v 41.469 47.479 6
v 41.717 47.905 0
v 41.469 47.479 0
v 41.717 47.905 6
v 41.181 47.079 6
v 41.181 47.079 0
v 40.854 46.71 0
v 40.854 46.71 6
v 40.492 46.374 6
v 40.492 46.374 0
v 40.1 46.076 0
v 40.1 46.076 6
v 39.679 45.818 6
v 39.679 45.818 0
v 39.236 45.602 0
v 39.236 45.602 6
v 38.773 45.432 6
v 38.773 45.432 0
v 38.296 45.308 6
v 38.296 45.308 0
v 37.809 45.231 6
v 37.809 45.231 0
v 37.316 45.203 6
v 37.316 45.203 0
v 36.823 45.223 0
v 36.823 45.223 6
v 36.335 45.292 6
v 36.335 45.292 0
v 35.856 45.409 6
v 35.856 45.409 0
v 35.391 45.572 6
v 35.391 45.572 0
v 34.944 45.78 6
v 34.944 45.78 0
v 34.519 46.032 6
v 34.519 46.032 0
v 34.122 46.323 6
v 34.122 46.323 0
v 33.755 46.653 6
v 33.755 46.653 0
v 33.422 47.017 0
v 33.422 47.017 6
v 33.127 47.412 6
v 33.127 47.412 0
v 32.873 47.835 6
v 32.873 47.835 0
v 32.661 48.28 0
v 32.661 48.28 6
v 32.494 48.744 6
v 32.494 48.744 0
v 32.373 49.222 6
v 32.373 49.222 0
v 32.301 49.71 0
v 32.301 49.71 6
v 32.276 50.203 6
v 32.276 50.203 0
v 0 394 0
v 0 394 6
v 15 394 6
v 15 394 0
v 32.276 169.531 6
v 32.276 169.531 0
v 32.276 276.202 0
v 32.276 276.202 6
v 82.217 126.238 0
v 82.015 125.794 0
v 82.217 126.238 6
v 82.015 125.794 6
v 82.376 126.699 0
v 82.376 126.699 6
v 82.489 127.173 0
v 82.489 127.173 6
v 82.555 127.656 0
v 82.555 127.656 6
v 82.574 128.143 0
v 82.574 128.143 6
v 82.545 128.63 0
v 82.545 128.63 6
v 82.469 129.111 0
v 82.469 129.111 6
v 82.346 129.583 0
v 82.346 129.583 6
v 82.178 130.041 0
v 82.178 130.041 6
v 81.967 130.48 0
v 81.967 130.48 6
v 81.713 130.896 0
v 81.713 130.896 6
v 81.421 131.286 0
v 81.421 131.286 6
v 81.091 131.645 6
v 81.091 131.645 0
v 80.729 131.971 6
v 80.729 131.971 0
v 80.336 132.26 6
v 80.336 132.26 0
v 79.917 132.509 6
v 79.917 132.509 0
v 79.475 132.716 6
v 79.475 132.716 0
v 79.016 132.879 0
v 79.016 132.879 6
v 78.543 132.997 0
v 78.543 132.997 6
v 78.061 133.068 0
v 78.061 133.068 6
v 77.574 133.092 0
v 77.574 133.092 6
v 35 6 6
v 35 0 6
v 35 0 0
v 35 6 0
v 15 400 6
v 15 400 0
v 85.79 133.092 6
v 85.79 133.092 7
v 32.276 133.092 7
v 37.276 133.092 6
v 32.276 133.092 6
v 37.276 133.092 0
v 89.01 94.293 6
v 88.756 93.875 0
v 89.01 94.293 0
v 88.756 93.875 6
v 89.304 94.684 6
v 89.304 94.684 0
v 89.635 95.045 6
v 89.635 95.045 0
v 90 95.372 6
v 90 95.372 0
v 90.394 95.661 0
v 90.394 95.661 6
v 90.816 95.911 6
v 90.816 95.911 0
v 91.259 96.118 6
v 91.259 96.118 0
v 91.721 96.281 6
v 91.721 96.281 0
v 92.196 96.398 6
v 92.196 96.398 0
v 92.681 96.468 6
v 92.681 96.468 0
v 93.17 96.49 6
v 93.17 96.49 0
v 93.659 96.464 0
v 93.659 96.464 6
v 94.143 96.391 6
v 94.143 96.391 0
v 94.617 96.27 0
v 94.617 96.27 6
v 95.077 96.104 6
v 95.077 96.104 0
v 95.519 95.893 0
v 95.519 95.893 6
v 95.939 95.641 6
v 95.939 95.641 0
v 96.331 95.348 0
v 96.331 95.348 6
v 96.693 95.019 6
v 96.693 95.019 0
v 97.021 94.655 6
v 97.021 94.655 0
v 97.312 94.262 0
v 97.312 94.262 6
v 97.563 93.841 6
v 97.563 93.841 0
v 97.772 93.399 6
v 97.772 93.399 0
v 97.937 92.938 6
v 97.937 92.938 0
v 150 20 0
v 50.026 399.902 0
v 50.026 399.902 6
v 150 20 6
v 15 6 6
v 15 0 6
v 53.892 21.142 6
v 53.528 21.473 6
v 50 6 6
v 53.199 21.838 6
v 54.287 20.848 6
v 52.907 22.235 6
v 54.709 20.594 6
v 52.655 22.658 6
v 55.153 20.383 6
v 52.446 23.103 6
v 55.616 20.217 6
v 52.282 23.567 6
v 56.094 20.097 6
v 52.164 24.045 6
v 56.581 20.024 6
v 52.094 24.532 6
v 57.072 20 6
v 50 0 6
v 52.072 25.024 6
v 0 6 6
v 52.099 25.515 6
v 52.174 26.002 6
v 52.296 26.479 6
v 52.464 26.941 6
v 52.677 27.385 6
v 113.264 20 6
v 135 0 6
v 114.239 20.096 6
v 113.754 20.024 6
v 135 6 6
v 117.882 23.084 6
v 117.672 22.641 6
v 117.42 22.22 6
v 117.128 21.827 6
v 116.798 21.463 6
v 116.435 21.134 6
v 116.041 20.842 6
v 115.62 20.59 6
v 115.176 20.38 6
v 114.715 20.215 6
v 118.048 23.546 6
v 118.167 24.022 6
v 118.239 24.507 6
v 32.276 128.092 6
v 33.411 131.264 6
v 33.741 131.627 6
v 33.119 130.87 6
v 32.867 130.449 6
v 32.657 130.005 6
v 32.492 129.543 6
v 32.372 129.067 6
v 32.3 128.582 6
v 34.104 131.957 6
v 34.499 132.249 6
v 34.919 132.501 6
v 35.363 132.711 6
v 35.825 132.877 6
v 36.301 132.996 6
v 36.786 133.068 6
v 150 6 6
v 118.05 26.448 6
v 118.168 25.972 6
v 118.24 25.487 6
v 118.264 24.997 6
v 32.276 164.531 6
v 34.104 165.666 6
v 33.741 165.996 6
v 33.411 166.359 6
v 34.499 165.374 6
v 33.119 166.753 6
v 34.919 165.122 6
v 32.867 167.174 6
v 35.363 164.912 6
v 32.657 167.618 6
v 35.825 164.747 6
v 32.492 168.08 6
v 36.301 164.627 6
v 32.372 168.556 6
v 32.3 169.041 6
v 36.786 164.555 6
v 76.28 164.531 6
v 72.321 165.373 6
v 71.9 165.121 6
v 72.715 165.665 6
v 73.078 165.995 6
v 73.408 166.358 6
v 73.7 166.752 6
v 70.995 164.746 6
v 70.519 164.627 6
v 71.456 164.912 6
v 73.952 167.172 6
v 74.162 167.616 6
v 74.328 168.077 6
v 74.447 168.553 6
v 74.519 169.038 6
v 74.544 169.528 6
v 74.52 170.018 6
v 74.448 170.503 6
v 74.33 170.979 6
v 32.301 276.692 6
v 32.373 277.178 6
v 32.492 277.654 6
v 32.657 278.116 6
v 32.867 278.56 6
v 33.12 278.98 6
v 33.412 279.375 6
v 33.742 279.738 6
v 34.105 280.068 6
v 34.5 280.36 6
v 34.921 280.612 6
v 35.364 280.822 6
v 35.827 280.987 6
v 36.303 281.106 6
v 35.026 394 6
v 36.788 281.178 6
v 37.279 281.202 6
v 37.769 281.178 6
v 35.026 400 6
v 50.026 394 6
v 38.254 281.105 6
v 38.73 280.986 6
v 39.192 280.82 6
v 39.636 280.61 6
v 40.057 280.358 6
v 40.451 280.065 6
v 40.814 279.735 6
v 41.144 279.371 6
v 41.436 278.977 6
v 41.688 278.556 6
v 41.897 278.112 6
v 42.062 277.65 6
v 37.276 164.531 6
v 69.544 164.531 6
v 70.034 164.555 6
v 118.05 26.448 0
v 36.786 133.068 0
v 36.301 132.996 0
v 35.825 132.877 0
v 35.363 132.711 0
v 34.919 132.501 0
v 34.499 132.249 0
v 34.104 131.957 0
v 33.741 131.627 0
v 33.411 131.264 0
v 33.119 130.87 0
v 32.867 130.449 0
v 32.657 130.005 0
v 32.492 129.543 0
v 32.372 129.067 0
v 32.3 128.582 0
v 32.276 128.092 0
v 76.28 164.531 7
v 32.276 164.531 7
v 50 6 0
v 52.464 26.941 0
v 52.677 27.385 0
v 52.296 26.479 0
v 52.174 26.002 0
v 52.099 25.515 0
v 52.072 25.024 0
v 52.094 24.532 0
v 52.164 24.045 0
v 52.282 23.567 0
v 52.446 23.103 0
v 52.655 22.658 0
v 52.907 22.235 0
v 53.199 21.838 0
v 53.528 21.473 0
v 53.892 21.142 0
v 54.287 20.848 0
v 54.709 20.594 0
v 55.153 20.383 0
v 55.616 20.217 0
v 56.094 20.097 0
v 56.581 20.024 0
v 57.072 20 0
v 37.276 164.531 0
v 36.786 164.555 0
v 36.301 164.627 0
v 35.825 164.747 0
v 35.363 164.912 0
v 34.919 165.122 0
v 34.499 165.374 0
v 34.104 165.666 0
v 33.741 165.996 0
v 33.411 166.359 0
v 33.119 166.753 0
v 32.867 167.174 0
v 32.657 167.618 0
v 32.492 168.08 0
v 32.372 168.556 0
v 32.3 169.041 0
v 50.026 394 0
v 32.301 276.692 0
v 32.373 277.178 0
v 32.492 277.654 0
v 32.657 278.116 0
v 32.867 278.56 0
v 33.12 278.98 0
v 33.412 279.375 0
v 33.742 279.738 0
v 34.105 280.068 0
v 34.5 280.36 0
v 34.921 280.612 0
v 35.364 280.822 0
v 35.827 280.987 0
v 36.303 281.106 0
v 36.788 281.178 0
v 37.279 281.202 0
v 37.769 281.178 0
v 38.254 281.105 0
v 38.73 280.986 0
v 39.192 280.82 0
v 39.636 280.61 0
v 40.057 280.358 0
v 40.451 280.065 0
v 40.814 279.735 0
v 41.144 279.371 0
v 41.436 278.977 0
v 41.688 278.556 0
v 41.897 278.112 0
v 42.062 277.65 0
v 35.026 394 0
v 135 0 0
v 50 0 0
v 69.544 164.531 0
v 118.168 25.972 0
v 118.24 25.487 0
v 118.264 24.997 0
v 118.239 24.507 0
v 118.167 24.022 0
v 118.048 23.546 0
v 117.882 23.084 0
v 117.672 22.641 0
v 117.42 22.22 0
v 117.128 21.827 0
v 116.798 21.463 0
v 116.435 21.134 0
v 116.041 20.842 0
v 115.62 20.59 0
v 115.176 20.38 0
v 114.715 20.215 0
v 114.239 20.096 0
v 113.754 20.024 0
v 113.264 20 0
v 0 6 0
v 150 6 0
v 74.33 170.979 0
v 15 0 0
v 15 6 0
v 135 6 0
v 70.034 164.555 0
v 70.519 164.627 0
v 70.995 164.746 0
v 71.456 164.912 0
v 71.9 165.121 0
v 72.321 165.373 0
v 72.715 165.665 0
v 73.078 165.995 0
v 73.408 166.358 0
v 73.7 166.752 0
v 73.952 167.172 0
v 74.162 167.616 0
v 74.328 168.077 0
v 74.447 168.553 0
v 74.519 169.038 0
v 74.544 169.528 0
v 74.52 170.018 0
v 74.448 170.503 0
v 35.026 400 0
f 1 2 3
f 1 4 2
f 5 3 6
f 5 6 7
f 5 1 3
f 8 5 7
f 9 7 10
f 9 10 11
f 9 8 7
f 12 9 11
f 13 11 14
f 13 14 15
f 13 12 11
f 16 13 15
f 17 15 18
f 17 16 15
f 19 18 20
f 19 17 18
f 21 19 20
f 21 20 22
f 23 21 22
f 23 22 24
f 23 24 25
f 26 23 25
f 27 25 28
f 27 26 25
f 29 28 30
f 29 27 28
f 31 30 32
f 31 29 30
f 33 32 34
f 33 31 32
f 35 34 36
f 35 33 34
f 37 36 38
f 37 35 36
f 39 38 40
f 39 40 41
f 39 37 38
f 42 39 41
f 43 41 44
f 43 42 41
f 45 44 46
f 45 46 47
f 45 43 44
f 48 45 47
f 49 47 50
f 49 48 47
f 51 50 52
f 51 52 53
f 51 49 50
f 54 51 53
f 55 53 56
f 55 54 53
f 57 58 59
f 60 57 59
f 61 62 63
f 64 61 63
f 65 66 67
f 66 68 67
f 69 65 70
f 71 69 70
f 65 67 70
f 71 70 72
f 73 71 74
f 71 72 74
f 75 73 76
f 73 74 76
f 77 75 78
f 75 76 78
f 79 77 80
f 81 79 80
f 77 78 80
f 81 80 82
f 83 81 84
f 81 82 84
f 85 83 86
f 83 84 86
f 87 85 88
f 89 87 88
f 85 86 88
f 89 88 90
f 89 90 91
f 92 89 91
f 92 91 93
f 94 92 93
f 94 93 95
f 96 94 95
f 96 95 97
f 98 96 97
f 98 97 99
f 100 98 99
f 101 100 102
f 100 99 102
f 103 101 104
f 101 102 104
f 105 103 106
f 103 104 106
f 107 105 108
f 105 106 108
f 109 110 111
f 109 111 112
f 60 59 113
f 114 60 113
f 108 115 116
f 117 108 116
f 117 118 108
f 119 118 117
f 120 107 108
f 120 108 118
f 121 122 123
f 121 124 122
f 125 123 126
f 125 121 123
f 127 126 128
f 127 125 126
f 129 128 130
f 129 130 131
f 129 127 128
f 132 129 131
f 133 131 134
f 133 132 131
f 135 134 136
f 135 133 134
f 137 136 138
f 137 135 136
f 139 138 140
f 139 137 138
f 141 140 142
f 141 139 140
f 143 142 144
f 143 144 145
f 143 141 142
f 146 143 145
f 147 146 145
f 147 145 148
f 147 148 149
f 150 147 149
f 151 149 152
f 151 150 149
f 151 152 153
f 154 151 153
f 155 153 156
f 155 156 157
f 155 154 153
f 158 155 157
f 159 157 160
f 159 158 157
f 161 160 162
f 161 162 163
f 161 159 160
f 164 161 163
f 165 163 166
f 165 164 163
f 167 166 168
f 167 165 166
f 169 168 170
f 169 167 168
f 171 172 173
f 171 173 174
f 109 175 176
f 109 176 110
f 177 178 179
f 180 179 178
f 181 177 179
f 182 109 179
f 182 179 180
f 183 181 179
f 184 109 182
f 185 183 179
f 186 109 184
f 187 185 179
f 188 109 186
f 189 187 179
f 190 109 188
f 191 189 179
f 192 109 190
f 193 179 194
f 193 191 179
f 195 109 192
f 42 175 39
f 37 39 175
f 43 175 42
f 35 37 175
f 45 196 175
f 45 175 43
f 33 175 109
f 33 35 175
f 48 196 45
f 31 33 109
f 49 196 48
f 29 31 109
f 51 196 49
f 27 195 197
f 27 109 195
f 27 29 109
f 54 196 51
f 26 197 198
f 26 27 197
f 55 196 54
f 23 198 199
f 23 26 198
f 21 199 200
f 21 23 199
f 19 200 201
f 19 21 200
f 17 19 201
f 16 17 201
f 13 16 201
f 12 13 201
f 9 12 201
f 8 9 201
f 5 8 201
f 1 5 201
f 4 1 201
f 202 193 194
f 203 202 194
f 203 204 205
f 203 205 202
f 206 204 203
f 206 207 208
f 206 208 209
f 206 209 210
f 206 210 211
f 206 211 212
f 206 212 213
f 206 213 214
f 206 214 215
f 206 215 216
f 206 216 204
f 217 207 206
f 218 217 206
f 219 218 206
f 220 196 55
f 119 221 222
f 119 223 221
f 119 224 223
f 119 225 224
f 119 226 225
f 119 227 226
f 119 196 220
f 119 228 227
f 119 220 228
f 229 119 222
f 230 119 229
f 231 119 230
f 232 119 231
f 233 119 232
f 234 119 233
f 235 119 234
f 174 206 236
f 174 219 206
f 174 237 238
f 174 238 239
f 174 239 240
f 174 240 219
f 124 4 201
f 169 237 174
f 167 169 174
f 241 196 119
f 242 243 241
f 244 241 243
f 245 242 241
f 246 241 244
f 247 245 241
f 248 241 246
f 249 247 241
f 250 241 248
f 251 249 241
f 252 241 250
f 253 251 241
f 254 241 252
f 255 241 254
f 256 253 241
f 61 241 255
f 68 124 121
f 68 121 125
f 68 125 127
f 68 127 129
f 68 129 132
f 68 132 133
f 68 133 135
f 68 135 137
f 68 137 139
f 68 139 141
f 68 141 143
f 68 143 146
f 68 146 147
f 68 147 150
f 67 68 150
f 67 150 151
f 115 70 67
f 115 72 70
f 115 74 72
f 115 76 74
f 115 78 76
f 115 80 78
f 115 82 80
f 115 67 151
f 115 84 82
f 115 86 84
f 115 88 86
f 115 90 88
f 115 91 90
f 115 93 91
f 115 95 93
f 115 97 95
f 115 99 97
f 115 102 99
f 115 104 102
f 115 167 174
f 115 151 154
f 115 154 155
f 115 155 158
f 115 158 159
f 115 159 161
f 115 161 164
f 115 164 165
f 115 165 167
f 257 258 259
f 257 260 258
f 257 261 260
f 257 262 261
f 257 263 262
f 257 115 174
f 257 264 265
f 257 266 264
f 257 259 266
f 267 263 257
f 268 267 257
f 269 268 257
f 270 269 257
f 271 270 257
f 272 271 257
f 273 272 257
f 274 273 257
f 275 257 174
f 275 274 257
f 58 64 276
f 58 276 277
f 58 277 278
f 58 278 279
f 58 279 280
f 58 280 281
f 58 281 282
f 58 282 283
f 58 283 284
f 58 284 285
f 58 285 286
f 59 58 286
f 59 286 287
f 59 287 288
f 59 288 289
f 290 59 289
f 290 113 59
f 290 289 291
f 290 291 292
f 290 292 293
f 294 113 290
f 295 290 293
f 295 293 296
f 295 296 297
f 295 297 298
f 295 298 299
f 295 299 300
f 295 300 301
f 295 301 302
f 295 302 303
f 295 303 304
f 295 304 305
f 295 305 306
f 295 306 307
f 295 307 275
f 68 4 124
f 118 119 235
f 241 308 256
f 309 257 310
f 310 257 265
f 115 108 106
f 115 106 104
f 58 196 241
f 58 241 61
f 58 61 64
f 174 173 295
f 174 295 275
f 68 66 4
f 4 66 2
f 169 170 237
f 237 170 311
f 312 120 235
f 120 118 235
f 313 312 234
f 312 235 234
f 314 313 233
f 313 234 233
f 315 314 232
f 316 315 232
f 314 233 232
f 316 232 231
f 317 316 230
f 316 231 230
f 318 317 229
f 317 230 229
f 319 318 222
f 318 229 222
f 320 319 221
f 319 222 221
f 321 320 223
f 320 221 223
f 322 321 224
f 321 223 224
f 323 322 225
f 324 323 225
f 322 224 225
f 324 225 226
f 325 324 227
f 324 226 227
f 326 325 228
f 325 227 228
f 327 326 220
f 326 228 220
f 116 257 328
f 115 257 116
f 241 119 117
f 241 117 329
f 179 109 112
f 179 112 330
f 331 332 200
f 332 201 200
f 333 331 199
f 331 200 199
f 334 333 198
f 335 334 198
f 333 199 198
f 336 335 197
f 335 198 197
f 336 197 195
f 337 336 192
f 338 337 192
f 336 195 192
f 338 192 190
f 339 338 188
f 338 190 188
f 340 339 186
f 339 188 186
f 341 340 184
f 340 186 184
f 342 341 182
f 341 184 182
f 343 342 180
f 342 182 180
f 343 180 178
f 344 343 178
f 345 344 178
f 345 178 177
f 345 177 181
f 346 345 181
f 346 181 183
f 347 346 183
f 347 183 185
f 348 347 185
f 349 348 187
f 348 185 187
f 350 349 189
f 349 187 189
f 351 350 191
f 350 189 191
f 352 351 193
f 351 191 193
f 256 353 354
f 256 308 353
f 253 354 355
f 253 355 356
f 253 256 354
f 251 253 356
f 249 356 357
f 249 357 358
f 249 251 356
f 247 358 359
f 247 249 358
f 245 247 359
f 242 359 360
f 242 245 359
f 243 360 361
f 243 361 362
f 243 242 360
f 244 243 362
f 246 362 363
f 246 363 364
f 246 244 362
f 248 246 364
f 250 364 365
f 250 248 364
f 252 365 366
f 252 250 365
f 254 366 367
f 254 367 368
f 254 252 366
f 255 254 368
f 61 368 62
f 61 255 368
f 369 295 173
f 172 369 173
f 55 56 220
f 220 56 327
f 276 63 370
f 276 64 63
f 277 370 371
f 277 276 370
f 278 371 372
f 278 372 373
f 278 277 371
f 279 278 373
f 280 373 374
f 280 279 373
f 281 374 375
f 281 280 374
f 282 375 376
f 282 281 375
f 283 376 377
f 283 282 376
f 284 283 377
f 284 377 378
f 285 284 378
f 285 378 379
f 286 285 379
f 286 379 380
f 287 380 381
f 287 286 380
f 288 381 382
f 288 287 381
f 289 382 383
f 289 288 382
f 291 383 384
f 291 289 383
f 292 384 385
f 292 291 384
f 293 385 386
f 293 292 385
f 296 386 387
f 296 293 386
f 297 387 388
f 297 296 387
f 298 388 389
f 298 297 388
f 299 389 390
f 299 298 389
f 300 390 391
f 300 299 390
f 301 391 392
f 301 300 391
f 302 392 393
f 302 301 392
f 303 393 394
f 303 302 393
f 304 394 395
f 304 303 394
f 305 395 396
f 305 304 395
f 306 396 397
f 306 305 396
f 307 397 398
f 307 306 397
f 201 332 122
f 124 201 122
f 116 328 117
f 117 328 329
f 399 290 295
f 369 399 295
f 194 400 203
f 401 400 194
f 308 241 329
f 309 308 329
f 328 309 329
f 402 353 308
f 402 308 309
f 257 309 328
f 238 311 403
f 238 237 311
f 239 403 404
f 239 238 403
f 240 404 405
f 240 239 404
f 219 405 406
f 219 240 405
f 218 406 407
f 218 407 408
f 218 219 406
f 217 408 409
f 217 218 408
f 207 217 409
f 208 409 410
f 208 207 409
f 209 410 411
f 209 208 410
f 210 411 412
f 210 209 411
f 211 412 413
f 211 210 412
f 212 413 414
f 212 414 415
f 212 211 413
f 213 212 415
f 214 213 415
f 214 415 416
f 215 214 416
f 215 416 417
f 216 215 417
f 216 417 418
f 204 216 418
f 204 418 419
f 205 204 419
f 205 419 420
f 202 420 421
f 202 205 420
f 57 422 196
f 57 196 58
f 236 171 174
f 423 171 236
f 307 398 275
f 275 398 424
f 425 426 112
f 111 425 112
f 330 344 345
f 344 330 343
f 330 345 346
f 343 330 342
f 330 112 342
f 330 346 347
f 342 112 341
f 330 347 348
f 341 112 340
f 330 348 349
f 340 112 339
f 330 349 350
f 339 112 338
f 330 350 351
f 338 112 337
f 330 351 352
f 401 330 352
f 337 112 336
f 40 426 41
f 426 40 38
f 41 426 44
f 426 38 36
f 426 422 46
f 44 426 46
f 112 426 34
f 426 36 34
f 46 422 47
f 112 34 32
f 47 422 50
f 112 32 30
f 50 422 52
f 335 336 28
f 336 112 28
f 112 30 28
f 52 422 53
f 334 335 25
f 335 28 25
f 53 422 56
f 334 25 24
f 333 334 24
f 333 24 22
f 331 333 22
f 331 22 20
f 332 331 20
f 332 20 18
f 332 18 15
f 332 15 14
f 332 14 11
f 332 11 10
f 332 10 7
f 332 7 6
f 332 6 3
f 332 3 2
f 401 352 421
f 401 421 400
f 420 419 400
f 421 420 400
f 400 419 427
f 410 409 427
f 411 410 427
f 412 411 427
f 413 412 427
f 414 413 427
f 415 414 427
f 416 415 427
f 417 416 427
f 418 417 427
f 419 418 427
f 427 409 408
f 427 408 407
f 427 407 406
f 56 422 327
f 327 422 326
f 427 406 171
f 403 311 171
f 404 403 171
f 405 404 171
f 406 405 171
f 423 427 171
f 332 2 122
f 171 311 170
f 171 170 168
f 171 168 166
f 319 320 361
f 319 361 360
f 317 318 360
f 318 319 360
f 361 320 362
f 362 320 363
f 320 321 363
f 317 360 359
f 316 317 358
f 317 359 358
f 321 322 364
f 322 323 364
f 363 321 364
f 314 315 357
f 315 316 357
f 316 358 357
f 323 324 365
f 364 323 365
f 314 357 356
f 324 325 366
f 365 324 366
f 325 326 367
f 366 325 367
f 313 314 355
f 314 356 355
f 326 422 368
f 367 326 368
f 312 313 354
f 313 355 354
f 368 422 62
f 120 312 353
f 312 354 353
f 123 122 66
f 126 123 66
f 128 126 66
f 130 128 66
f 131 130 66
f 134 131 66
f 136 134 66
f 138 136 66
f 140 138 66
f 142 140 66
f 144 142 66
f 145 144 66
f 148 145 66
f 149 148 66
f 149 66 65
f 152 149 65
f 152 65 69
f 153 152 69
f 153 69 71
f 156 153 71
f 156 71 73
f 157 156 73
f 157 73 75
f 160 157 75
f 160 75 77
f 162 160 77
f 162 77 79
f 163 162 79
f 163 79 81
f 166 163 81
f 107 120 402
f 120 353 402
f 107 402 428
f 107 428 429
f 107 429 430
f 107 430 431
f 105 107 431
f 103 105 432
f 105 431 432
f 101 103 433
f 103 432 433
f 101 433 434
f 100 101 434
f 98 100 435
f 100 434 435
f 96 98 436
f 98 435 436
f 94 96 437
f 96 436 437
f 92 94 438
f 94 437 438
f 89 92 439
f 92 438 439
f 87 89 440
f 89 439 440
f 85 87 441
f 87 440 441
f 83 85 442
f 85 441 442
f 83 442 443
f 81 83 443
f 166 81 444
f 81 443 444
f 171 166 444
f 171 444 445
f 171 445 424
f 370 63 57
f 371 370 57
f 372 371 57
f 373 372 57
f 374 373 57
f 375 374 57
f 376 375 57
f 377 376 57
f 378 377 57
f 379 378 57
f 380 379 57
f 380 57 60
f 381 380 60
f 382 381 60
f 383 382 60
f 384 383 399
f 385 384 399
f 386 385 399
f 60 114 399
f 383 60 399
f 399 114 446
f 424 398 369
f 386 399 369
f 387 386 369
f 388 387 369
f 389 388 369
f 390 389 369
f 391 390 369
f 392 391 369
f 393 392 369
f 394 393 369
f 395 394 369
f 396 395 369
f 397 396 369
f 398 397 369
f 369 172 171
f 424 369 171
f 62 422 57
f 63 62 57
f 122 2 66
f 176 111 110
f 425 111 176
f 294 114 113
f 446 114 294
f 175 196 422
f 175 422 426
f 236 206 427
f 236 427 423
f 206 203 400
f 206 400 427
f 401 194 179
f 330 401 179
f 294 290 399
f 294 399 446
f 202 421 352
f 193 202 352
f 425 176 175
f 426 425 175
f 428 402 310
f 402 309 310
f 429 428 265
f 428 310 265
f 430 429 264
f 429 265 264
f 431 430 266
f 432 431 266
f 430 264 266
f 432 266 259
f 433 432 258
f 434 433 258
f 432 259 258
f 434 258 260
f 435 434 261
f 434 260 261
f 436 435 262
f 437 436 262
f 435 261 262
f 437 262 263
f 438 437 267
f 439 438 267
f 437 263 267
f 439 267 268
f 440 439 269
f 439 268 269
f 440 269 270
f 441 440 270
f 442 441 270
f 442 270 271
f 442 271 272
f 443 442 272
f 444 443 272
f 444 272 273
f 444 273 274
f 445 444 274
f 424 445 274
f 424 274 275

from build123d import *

# Parameters (mm, degrees)
RESSALTO_EXTRUS_O1_DEPTH = 6
CORTE_EXTRUS_O1_DEPTH    = 428.242320001
FILETE1_R                = 5
RESSALTO_EXTRUS_O3_DEPTH = 7
RESSALTO_EXTRUS_O4_DEPTH = 6
FILETE2_R                = 5
ESBO_O13_W               = 15
ESBO_O13_H               = 6
CORTE_EXTRUS_O2_DEPTH    = 428.242320001
ESBO_O15_W               = 15
ESBO_O15_H               = 6
CORTE_EXTRUS_O3_DEPTH    = 428.242320001


with BuildPart() as part:
    # Esboço2 → Ressalto-extrusão1 (new body)
    with BuildSketch(Plane.XY):
        Polygon((0, 0), (0, 400), (50, 400), (150, 20), (150, 0), align=None)
    extrude(amount=RESSALTO_EXTRUS_O1_DEPTH)

    # Esboço7 → Corte-extrusão1 (cut, through all)
    with BuildSketch(Plane(origin=(0, 0, 0), x_dir=(-1, 0, 0), z_dir=(0, 0, -1))):
        Polygon((-32.276413741, 20), (-32.276413741, 310), (-120, 20), align=None)
    extrude(amount=-CORTE_EXTRUS_O1_DEPTH, mode=Mode.SUBTRACT)

    # Filete1
    filete1_edges = [part.edges().sort_by_distance(p)[0] for p in [
        (32.276413741, 20, 3),
        (120, 20, 3),
        (32.276413741, 310, 3),
    ]]
    fillet(filete1_edges, radius=FILETE1_R)

    # Esboço11 → Ressalto-extrusão3 (add)
    with BuildSketch(Plane(origin=(0, 0, 0), x_dir=(-1, 0, 0), z_dir=(0, 0, -1))):
        Polygon((-85.790275479, 133.09182096), (-32.276413741, 133.09182096), (-32.276413741, 164.53133753), (-76.279974983, 164.53133753), align=None)
    extrude(amount=-RESSALTO_EXTRUS_O3_DEPTH)

    # Esboço12 → Ressalto-extrusão4 (add)
    with BuildSketch(Plane(origin=(0, 0, 0), x_dir=(-1, 0, 0), z_dir=(0, 0, -1))):
        Polygon((-85.790275479, 133.09182096), (-32.276413741, 29.65724659), (-27.594715127, 20), (-48.670406936, 20), (-94.468741252, 104.402215557), align=None)
    extrude(amount=-RESSALTO_EXTRUS_O4_DEPTH)

    # Filete2
    filete2_edges = [part.edges().sort_by_distance(p)[0] for p in [
        (32.276413741, 133.09182096, 3),
        (32.276413741, 164.53133753, 3),
        (85.790275479, 133.09182096, 3),
        (76.279974983, 164.53133753, 3),
        (94.468741252, 104.402215557, 3),
        (32.276413741, 29.65724659, 3),
        (48.670406936, 20, 3),
    ]]
    fillet(filete2_edges, radius=FILETE2_R)

    # Esboço13 → Corte-extrusão2 (cut, through all)
    with BuildSketch(Plane.XY.offset(6)):
        with Locations((7.5, 397)):
            Rectangle(ESBO_O13_W, ESBO_O13_H)
        with Locations((42.525660804, 397)):
            Rectangle(ESBO_O13_W, ESBO_O13_H)
    extrude(amount=-CORTE_EXTRUS_O2_DEPTH, mode=Mode.SUBTRACT)

    # Esboço15 → Corte-extrusão3 (cut, through all)
    with BuildSketch(Plane.XY.offset(6)):
        with Locations((7.5, 3)):
            Rectangle(ESBO_O15_W, ESBO_O15_H)
        with Locations((42.5, 3)):
            Rectangle(ESBO_O15_W, ESBO_O15_H)
        with Locations((142.5, 3)):
            Rectangle(ESBO_O15_W, ESBO_O15_H)
    extrude(amount=-CORTE_EXTRUS_O3_DEPTH, mode=Mode.SUBTRACT)


solid = part.part
